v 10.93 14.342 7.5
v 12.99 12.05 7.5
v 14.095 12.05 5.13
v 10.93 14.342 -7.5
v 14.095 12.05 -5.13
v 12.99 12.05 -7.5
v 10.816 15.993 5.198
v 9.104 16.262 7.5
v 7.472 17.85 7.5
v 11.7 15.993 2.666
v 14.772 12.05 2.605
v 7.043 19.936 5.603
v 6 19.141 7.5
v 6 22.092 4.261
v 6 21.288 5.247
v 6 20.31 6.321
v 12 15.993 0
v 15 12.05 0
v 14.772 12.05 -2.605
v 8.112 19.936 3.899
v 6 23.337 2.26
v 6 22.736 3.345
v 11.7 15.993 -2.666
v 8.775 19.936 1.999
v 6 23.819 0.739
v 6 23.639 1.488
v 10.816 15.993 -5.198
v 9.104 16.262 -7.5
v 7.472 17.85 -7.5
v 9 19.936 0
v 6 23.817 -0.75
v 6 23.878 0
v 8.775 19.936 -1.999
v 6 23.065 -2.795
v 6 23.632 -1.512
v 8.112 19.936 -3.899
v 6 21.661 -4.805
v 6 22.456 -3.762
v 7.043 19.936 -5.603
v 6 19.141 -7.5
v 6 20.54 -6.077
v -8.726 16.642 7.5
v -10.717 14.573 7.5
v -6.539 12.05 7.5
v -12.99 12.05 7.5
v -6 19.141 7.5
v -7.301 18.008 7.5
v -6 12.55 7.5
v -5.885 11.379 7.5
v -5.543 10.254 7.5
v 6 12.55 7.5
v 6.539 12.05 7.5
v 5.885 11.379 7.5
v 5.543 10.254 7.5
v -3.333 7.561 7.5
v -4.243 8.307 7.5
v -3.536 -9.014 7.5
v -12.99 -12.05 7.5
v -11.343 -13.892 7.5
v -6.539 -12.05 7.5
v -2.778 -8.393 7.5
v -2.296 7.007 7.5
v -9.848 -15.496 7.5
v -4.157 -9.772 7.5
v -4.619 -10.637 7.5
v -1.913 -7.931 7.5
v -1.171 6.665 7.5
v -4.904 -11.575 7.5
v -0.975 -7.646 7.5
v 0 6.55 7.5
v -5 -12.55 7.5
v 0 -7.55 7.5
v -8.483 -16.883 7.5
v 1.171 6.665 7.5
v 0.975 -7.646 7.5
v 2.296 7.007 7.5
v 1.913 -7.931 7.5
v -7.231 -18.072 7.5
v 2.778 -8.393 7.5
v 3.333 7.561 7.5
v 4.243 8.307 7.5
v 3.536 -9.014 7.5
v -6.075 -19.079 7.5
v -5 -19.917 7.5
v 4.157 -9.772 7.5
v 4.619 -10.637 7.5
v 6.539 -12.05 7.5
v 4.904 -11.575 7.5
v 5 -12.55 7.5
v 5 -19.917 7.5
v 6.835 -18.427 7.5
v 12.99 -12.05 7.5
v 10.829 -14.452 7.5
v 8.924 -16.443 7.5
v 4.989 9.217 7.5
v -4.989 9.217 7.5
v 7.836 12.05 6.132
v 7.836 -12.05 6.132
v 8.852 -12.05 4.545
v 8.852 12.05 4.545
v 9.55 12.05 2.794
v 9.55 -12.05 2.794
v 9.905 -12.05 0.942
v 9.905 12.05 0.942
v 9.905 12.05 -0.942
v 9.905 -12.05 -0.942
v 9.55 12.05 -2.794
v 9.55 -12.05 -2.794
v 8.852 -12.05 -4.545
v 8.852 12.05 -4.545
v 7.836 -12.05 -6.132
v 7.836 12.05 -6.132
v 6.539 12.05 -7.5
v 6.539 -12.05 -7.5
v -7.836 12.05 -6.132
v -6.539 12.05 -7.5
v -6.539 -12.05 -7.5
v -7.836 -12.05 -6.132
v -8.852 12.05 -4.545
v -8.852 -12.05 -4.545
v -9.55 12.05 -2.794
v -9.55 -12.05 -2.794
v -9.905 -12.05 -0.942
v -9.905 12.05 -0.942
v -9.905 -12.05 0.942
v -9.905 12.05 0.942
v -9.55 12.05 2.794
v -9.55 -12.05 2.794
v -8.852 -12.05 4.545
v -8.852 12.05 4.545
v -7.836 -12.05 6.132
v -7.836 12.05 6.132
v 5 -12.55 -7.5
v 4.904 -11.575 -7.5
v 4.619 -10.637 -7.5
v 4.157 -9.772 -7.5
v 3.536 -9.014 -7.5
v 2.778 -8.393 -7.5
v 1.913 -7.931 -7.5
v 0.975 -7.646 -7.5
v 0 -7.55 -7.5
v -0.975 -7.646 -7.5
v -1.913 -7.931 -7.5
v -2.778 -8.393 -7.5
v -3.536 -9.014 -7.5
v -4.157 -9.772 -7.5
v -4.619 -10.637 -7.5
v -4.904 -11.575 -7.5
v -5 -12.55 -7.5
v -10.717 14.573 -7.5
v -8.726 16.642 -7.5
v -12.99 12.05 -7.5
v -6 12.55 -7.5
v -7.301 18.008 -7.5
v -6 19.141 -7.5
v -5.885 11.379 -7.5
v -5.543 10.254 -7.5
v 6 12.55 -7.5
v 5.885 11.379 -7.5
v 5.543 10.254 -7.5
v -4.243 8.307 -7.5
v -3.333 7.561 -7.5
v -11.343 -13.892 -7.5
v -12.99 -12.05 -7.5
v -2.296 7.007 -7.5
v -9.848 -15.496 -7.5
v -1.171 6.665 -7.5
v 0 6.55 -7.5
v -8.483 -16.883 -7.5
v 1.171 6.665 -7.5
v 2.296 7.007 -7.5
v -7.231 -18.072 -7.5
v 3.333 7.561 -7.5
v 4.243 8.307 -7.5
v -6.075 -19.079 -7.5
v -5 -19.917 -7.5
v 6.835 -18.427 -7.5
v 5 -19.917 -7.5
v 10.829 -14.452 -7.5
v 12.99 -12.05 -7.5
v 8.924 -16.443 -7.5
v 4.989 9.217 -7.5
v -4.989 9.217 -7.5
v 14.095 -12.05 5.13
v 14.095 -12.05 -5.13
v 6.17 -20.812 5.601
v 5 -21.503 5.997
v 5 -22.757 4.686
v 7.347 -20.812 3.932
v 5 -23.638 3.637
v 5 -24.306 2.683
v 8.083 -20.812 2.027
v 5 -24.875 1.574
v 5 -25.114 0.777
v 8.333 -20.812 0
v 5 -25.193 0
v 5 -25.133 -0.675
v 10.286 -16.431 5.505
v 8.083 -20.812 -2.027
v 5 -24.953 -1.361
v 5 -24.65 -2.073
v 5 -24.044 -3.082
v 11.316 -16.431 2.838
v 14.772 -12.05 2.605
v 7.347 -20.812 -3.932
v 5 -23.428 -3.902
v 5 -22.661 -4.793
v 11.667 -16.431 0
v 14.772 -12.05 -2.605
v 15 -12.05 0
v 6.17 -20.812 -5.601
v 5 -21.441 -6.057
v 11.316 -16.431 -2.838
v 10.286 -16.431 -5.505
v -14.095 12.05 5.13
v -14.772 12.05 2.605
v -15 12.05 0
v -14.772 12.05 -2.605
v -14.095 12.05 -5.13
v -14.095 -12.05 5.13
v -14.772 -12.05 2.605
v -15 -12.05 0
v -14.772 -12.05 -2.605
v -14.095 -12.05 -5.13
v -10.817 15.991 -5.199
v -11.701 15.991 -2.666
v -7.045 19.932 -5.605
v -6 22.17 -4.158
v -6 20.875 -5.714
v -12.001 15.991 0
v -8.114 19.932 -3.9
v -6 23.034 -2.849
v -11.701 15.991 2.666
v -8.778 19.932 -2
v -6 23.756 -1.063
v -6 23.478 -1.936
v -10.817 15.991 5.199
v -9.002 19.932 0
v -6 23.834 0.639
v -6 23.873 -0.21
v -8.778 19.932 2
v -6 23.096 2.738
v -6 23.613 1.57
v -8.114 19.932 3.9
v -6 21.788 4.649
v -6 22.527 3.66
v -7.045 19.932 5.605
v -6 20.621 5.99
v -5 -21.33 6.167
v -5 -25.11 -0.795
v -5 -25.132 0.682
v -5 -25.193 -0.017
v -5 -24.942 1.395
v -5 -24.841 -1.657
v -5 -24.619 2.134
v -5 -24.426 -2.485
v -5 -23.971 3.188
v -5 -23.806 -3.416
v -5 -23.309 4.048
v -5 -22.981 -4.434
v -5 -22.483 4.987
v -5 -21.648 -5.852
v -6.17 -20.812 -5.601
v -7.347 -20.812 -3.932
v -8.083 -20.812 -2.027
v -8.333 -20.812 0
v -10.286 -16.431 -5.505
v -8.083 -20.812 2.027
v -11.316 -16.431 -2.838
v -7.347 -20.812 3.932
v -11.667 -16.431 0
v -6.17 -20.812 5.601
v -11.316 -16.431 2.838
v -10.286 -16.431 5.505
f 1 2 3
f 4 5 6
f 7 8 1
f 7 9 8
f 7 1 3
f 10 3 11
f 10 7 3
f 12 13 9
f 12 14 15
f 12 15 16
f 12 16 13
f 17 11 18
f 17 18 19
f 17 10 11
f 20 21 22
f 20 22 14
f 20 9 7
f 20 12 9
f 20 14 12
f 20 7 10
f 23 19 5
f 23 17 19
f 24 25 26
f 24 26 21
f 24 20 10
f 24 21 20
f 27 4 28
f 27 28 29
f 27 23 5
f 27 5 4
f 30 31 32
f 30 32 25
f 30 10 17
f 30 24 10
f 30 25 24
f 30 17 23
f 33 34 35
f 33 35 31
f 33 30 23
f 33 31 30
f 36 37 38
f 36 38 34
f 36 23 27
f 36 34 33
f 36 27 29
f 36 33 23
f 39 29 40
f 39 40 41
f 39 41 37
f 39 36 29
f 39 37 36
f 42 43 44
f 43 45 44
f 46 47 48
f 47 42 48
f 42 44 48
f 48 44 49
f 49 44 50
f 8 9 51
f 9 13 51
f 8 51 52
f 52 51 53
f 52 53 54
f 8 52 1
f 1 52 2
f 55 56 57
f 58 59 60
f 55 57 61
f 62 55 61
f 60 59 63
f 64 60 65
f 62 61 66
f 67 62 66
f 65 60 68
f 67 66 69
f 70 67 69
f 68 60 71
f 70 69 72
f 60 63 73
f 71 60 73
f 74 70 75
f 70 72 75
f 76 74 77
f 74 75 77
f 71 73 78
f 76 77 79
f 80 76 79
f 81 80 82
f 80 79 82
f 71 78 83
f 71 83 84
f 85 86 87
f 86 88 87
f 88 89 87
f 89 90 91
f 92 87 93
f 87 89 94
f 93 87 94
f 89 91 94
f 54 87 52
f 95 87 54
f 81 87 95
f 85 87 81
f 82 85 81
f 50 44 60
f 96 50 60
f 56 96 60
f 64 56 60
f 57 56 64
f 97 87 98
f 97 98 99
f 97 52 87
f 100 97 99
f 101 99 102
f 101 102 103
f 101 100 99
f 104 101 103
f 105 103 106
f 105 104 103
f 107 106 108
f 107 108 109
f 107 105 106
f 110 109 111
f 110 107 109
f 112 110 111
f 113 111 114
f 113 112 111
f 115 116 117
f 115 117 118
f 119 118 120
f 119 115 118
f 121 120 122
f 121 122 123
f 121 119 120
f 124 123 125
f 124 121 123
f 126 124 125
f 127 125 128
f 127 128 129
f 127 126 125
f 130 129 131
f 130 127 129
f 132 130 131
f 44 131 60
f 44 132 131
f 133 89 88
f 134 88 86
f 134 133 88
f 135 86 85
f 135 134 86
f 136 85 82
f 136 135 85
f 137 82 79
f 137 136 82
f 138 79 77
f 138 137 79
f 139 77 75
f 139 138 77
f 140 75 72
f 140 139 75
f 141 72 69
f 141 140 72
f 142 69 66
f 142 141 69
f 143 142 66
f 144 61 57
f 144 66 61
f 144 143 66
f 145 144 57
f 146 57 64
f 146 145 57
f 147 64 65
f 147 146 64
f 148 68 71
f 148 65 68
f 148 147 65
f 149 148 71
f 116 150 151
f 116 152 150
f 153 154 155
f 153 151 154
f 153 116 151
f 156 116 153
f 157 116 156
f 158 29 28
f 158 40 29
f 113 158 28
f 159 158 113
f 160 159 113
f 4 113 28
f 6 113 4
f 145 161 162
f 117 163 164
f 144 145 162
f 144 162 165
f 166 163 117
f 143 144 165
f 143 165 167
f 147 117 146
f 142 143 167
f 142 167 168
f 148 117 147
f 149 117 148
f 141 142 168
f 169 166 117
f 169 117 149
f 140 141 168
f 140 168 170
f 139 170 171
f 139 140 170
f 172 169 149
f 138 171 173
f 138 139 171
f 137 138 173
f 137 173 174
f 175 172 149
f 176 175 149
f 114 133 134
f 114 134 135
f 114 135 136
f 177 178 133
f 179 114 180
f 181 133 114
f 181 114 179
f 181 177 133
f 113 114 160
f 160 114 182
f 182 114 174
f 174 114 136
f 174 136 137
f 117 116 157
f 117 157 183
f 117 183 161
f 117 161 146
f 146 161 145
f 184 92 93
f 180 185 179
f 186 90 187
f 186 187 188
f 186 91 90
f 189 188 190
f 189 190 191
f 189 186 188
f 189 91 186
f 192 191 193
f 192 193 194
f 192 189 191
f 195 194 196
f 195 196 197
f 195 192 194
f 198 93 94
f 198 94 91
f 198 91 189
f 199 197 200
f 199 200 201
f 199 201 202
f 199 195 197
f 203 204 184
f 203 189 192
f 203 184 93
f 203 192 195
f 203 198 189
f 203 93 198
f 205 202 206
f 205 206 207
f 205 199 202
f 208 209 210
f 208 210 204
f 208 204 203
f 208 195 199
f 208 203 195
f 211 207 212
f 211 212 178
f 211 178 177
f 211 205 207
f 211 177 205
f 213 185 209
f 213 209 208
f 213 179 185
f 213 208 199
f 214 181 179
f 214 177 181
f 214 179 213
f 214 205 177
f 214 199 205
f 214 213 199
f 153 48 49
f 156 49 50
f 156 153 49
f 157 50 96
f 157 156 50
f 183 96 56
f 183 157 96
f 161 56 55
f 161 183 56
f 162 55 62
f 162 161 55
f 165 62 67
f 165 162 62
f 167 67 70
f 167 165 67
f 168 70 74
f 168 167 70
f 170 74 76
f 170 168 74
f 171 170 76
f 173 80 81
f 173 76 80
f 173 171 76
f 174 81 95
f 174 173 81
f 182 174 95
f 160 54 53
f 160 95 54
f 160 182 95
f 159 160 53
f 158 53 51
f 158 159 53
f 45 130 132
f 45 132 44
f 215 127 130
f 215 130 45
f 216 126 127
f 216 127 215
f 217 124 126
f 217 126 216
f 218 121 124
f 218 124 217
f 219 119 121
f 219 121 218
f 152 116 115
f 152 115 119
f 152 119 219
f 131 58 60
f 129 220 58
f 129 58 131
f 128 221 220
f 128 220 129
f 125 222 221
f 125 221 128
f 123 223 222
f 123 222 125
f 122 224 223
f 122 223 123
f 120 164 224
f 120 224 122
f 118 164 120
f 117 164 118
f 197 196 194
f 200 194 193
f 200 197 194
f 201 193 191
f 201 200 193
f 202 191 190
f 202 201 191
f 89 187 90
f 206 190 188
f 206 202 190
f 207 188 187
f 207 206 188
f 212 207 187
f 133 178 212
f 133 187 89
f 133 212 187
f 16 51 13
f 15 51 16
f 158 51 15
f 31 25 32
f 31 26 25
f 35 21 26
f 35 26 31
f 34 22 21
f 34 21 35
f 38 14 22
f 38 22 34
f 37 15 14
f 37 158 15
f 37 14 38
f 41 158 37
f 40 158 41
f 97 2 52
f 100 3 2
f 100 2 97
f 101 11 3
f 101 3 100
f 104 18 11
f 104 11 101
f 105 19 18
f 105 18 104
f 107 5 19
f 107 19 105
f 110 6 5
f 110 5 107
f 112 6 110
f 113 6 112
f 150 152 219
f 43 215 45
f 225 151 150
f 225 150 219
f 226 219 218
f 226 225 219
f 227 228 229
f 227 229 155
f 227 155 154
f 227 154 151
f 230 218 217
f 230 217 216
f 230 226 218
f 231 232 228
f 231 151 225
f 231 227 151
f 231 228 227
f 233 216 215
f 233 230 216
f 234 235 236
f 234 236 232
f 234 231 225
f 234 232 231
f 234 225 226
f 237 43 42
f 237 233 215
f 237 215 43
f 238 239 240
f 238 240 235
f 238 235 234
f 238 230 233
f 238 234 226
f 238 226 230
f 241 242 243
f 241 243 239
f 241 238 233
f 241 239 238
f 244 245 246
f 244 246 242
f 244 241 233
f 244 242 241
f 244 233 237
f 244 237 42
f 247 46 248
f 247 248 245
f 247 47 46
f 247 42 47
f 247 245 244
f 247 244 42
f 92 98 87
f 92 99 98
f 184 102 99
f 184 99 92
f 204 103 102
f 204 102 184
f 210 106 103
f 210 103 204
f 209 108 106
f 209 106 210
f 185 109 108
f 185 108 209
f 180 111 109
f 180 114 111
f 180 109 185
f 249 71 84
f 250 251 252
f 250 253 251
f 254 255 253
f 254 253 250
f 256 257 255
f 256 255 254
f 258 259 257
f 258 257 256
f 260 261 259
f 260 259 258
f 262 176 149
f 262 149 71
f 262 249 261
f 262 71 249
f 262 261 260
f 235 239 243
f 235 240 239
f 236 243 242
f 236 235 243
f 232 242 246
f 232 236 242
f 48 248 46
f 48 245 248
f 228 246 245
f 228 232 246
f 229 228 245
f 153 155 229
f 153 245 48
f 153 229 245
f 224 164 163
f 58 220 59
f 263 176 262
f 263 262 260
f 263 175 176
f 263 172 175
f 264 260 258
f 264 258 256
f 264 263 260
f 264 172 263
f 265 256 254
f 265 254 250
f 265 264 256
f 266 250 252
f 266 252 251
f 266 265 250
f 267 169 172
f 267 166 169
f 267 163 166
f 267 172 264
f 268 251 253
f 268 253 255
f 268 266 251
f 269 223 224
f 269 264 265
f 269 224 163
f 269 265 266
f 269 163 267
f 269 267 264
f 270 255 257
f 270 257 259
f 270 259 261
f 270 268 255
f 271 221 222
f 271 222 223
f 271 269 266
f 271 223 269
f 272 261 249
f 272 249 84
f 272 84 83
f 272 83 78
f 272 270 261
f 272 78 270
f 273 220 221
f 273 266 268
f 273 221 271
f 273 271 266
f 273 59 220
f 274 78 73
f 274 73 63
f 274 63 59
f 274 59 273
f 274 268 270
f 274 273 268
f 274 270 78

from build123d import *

# Parameters (mm, degrees)
ESBO_O2_OUTSIDE_W          = 45.75
ESBO_O2_OUTSIDE_H          = 45.75
ESBO_O2_OUTSIDE_W_2        = 30
ESBO_O2_OUTSIDE_H_2        = 15
CORTE_EXTRUS_O1_DEPTH      = 28.05
CORTE_EXTRUS_O1_DEPTH_BACK = 28.05
CORTE_EXTRUS_O2_DEPTH      = 16


with BuildPart() as part:
    # Esboço1 one side → Revolução1 (revolve)
    with BuildSketch(Plane.XY):
        with BuildLine():
            ThreePointArc((4, 26.506832295), (2.018355219, 26.913587797), (0, 27.05))
            Line((0, 27.05), (0, -27.05))
            ThreePointArc((0, -27.05), (2.018355219, -26.913587797), (4, -26.506832295))
            Line((4, -26.506832295), (15, -12.05))
            Line((15, -12.05), (9.95, -12.05))
            Line((9.95, -12.05), (9.95, 12.05))
            Line((9.95, 12.05), (15, 12.05))
            Line((15, 12.05), (4, 26.506832295))
        make_face()
    revolve(axis=Axis((0, -27.05, 0), (0, 1, 0)))

    # Esboço2 outside → Corte-extrusão1 (cut, two sides)
    with BuildSketch(Plane(origin=(0, 0, 0), x_dir=(1, 0, 0), z_dir=(0, 1, 0))) as corte_extrus_o1_sk:
        Rectangle(ESBO_O2_OUTSIDE_W, ESBO_O2_OUTSIDE_H)
        Rectangle(ESBO_O2_OUTSIDE_W_2, ESBO_O2_OUTSIDE_H_2, mode=Mode.SUBTRACT)
    extrude(amount=CORTE_EXTRUS_O1_DEPTH, mode=Mode.SUBTRACT)
    extrude(corte_extrus_o1_sk.sketch, amount=-CORTE_EXTRUS_O1_DEPTH_BACK, mode=Mode.SUBTRACT)

    # Esboço3 → Corte-extrusão2 (cut, through all)
    with BuildSketch(Plane(origin=(0, 0, -7.5), x_dir=(-1, 0, 0), z_dir=(0, 0, -1))):
        with BuildLine():
            Line((6, 27.05), (6, 12.55))
            ThreePointArc((6, 12.55), (0, 6.55), (-6, 12.55))
            Line((-6, 12.55), (-6, 27.05))
            ThreePointArc((-6, 27.05), (0, 33.05), (6, 27.05))
        make_face()
        with BuildLine():
            Line((-5, -27.05), (-5, -12.55))
            ThreePointArc((-5, -12.55), (0, -7.55), (5, -12.55))
            Line((5, -12.55), (5, -27.05))
            ThreePointArc((5, -27.05), (0, -32.05), (-5, -27.05))
        make_face()
    extrude(amount=-CORTE_EXTRUS_O2_DEPTH, mode=Mode.SUBTRACT)


solid = part.part
